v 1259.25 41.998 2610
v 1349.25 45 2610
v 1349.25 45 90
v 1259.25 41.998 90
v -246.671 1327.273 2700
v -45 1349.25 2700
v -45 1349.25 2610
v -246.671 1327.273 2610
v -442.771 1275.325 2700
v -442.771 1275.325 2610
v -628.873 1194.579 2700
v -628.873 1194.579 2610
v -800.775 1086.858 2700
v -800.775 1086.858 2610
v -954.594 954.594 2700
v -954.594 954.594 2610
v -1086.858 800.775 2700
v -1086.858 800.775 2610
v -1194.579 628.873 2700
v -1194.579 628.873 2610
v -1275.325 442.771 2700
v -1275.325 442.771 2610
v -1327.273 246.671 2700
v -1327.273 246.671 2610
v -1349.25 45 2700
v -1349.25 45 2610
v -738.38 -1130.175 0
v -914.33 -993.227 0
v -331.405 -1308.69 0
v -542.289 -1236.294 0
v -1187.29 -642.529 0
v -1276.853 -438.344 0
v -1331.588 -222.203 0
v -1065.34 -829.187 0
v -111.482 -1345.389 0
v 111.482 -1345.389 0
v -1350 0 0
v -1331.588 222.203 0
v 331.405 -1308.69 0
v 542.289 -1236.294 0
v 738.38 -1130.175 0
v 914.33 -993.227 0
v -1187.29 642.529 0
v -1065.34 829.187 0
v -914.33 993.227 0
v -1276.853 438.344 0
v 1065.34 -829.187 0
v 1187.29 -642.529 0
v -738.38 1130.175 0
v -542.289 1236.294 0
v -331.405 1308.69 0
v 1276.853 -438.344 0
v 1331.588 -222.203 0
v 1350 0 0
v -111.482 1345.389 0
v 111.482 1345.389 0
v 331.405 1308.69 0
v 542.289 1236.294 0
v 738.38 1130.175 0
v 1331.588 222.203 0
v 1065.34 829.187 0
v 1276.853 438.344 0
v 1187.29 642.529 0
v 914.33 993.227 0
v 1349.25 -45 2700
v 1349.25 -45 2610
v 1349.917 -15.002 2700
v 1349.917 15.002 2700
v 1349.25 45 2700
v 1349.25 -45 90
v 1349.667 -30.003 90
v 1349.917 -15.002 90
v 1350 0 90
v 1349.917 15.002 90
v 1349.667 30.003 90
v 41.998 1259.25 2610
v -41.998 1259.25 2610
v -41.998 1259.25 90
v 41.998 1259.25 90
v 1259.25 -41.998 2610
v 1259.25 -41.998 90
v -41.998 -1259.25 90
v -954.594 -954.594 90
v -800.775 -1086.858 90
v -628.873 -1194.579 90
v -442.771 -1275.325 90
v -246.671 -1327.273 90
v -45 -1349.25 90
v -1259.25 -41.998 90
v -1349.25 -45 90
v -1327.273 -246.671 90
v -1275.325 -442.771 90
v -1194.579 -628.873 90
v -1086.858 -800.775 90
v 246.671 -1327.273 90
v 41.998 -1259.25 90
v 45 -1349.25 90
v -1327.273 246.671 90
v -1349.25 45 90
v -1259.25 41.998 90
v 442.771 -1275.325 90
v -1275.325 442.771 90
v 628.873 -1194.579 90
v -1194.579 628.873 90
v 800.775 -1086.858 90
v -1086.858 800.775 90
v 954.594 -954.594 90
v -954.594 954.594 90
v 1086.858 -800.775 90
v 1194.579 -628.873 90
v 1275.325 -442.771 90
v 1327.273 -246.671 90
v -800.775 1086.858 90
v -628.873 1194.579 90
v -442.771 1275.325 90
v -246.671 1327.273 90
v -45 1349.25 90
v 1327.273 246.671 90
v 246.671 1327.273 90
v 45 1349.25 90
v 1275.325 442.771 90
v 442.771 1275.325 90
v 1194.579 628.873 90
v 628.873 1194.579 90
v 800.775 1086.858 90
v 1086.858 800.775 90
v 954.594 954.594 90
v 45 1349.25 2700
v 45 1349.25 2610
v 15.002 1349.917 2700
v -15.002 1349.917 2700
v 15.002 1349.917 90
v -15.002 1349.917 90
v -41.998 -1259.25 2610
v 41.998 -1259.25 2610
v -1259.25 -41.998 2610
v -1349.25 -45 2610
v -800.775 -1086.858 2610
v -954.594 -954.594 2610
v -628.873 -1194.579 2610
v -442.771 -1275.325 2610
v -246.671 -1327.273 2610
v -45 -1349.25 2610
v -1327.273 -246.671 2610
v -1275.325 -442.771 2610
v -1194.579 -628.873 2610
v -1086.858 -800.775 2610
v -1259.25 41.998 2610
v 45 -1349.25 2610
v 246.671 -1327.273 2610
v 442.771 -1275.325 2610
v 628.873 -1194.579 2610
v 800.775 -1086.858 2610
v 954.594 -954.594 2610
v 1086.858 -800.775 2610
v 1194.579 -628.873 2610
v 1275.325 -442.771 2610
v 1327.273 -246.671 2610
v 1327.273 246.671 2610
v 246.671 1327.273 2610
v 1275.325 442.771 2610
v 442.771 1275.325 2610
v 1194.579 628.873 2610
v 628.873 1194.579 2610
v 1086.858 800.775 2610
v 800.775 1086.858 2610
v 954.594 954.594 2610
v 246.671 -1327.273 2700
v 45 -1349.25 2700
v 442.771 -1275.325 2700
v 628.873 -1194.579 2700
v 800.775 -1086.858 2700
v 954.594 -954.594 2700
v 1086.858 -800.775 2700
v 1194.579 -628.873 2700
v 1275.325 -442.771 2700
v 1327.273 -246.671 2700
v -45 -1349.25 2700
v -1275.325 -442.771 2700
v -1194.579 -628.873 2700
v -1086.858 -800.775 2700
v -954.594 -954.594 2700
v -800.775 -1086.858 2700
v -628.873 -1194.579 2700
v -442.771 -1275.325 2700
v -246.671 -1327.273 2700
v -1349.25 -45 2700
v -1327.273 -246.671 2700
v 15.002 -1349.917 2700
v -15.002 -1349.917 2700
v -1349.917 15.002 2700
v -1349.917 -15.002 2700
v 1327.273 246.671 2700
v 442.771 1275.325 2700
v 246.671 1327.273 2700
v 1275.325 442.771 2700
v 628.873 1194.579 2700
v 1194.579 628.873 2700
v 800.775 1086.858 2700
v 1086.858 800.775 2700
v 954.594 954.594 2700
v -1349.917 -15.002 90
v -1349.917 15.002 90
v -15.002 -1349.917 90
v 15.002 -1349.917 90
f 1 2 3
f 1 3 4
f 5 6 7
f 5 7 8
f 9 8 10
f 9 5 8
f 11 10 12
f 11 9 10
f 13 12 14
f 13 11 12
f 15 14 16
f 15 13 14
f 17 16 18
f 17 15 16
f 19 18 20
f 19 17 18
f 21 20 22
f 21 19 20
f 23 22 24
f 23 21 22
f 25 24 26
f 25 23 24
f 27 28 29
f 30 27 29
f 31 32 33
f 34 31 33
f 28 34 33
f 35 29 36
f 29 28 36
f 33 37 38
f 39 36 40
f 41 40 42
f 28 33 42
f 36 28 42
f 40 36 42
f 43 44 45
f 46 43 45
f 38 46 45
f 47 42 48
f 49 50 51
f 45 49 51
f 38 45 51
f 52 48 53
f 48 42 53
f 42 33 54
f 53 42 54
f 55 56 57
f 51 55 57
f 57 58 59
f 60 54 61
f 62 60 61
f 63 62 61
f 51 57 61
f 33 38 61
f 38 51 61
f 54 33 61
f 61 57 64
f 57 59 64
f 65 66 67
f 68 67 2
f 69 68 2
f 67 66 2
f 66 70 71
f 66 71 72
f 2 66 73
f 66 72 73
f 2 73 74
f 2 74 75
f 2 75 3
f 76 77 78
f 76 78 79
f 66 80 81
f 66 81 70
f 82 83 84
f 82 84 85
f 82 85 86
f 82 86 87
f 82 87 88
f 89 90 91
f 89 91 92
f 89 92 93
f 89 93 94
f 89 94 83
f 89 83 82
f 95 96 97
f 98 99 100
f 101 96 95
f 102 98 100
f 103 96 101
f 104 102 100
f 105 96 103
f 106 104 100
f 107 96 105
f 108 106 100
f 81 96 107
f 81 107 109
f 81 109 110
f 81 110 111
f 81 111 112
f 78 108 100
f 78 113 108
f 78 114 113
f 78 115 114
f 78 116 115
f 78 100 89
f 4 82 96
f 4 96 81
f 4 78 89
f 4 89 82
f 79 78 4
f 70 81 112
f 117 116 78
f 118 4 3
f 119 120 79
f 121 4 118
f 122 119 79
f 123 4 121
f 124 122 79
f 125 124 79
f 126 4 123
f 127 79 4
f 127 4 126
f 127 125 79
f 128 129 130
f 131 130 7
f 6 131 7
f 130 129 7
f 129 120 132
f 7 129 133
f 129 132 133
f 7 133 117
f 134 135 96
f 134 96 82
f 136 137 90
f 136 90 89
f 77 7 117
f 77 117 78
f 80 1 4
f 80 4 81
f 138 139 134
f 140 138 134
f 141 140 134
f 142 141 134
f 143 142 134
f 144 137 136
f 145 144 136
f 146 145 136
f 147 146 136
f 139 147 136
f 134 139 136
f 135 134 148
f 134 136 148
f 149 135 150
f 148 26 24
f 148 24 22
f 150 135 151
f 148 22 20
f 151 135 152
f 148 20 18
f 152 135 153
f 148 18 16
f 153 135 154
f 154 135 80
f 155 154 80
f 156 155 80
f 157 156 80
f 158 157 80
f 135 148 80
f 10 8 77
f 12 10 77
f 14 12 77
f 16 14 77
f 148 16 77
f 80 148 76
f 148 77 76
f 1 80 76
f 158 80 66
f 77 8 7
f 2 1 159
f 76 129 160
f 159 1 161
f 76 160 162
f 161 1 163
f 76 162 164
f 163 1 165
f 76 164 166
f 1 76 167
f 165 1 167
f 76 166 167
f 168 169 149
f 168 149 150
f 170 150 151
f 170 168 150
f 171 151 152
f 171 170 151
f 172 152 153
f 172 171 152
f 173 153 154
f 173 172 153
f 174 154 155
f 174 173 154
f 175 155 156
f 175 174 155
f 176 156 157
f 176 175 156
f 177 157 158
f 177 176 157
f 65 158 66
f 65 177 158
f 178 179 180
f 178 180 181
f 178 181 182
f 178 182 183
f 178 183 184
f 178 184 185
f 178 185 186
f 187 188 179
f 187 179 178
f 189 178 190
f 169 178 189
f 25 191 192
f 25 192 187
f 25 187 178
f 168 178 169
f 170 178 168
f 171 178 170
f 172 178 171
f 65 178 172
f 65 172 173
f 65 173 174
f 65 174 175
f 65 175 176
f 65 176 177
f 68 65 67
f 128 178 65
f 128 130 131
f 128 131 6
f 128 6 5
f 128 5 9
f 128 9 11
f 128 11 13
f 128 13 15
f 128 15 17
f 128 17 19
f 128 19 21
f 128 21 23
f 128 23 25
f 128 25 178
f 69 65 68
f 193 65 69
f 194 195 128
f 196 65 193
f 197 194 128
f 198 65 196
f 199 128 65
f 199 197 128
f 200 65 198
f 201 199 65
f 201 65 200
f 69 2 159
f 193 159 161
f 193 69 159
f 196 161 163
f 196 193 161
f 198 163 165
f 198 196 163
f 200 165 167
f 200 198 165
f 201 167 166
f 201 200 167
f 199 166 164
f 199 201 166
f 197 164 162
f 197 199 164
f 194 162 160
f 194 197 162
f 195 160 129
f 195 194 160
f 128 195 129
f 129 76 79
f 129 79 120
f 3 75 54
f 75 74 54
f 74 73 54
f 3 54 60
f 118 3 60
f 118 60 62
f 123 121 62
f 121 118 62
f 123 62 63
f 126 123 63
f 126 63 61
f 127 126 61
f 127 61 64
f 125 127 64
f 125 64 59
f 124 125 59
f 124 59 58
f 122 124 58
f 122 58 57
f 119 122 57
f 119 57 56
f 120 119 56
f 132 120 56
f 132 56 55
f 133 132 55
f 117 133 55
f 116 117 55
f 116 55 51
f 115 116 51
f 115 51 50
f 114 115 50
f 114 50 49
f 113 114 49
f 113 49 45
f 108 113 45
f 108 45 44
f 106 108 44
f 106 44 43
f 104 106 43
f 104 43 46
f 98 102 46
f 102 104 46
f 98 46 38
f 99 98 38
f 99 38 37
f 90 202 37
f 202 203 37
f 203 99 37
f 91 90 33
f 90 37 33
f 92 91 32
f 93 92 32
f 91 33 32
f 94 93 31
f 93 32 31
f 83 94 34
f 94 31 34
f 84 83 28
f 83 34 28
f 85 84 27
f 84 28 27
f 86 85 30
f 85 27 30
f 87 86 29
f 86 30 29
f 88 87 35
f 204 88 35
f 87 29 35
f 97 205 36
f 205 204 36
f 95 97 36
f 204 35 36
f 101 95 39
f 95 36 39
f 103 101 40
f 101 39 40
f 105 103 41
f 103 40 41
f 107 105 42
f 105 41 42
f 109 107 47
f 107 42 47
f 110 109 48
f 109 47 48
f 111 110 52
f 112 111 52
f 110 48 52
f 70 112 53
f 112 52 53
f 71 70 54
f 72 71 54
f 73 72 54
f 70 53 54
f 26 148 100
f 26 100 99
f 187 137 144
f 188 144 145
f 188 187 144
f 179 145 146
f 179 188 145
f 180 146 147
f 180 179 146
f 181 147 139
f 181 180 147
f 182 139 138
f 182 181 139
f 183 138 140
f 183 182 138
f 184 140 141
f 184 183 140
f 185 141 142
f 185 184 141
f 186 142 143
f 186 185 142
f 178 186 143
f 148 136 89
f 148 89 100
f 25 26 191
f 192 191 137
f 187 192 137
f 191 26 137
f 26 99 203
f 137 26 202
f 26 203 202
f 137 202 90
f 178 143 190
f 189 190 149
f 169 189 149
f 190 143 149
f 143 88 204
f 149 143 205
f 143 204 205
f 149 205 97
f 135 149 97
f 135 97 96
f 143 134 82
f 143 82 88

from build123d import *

# Parameters (mm, degrees)
F0_R     = 1350
F1_DEPTH = 90
F3_DEPTH = 2610
F5_COUNT = 4
F7_DEPTH = 90


with BuildPart() as f1:
    # F0 (on Top) → F1 (new body)
    with BuildSketch(Plane.XY):
        Circle(F0_R)
    extrude(amount=F1_DEPTH)

    # F2 (on face) → F3 (join)
    with BuildSketch(Plane.XY.offset(90)):
        with BuildLine():
            Line((-1259.2497915508, 41.9983319432), (-1349.2497915508, 45))
            ThreePointArc((-1349.2497915508, 45), (-1350, 0), (-1349.2497915508, -45))
            Line((-1349.2497915508, -45), (-1259.2497915508, -41.9983319432))
            Line((-1259.2497915508, -41.9983319432), (-1259.2497915508, 0))
            Line((-1259.2497915508, 0), (-1259.2497915508, 41.9983319432))
        make_face()
    extrude(amount=F3_DEPTH)


with BuildPart() as f5_1:
    # F5: instance of F1
    add(f1.part.rotate(Axis((0, 0, 397.8728353977), (0, 0, 1)), 1 * 360 / F5_COUNT))


with BuildPart() as f5_2:
    # F5: instance of F1
    add(f1.part.rotate(Axis((0, 0, 397.8728353977), (0, 0, 1)), 2 * 360 / F5_COUNT))


with BuildPart() as f5_3:
    # F5: instance of F1
    add(f1.part.rotate(Axis((0, 0, 397.8728353977), (0, 0, 1)), 3 * 360 / F5_COUNT))


with BuildPart() as f1_1:
    add(f1.part)

    add(f5_1.part)  # F7 merges F5_1

    add(f5_2.part)  # F7 merges F5_2

    add(f5_3.part)  # F7 merges F5_3
    # F6 (on face) → F7 (join)
    with BuildSketch(Plane.XY.offset(2700)):
        with BuildLine():
            ThreePointArc((-1349.2497915508, 45), (-1350, 0), (-1349.2497915508, -45))
            ThreePointArc((-1349.2497915508, -45), (1350, 0), (-1349.2497915508, 45))
        make_face()
    extrude(amount=-F7_DEPTH)


solid = f1_1.part
